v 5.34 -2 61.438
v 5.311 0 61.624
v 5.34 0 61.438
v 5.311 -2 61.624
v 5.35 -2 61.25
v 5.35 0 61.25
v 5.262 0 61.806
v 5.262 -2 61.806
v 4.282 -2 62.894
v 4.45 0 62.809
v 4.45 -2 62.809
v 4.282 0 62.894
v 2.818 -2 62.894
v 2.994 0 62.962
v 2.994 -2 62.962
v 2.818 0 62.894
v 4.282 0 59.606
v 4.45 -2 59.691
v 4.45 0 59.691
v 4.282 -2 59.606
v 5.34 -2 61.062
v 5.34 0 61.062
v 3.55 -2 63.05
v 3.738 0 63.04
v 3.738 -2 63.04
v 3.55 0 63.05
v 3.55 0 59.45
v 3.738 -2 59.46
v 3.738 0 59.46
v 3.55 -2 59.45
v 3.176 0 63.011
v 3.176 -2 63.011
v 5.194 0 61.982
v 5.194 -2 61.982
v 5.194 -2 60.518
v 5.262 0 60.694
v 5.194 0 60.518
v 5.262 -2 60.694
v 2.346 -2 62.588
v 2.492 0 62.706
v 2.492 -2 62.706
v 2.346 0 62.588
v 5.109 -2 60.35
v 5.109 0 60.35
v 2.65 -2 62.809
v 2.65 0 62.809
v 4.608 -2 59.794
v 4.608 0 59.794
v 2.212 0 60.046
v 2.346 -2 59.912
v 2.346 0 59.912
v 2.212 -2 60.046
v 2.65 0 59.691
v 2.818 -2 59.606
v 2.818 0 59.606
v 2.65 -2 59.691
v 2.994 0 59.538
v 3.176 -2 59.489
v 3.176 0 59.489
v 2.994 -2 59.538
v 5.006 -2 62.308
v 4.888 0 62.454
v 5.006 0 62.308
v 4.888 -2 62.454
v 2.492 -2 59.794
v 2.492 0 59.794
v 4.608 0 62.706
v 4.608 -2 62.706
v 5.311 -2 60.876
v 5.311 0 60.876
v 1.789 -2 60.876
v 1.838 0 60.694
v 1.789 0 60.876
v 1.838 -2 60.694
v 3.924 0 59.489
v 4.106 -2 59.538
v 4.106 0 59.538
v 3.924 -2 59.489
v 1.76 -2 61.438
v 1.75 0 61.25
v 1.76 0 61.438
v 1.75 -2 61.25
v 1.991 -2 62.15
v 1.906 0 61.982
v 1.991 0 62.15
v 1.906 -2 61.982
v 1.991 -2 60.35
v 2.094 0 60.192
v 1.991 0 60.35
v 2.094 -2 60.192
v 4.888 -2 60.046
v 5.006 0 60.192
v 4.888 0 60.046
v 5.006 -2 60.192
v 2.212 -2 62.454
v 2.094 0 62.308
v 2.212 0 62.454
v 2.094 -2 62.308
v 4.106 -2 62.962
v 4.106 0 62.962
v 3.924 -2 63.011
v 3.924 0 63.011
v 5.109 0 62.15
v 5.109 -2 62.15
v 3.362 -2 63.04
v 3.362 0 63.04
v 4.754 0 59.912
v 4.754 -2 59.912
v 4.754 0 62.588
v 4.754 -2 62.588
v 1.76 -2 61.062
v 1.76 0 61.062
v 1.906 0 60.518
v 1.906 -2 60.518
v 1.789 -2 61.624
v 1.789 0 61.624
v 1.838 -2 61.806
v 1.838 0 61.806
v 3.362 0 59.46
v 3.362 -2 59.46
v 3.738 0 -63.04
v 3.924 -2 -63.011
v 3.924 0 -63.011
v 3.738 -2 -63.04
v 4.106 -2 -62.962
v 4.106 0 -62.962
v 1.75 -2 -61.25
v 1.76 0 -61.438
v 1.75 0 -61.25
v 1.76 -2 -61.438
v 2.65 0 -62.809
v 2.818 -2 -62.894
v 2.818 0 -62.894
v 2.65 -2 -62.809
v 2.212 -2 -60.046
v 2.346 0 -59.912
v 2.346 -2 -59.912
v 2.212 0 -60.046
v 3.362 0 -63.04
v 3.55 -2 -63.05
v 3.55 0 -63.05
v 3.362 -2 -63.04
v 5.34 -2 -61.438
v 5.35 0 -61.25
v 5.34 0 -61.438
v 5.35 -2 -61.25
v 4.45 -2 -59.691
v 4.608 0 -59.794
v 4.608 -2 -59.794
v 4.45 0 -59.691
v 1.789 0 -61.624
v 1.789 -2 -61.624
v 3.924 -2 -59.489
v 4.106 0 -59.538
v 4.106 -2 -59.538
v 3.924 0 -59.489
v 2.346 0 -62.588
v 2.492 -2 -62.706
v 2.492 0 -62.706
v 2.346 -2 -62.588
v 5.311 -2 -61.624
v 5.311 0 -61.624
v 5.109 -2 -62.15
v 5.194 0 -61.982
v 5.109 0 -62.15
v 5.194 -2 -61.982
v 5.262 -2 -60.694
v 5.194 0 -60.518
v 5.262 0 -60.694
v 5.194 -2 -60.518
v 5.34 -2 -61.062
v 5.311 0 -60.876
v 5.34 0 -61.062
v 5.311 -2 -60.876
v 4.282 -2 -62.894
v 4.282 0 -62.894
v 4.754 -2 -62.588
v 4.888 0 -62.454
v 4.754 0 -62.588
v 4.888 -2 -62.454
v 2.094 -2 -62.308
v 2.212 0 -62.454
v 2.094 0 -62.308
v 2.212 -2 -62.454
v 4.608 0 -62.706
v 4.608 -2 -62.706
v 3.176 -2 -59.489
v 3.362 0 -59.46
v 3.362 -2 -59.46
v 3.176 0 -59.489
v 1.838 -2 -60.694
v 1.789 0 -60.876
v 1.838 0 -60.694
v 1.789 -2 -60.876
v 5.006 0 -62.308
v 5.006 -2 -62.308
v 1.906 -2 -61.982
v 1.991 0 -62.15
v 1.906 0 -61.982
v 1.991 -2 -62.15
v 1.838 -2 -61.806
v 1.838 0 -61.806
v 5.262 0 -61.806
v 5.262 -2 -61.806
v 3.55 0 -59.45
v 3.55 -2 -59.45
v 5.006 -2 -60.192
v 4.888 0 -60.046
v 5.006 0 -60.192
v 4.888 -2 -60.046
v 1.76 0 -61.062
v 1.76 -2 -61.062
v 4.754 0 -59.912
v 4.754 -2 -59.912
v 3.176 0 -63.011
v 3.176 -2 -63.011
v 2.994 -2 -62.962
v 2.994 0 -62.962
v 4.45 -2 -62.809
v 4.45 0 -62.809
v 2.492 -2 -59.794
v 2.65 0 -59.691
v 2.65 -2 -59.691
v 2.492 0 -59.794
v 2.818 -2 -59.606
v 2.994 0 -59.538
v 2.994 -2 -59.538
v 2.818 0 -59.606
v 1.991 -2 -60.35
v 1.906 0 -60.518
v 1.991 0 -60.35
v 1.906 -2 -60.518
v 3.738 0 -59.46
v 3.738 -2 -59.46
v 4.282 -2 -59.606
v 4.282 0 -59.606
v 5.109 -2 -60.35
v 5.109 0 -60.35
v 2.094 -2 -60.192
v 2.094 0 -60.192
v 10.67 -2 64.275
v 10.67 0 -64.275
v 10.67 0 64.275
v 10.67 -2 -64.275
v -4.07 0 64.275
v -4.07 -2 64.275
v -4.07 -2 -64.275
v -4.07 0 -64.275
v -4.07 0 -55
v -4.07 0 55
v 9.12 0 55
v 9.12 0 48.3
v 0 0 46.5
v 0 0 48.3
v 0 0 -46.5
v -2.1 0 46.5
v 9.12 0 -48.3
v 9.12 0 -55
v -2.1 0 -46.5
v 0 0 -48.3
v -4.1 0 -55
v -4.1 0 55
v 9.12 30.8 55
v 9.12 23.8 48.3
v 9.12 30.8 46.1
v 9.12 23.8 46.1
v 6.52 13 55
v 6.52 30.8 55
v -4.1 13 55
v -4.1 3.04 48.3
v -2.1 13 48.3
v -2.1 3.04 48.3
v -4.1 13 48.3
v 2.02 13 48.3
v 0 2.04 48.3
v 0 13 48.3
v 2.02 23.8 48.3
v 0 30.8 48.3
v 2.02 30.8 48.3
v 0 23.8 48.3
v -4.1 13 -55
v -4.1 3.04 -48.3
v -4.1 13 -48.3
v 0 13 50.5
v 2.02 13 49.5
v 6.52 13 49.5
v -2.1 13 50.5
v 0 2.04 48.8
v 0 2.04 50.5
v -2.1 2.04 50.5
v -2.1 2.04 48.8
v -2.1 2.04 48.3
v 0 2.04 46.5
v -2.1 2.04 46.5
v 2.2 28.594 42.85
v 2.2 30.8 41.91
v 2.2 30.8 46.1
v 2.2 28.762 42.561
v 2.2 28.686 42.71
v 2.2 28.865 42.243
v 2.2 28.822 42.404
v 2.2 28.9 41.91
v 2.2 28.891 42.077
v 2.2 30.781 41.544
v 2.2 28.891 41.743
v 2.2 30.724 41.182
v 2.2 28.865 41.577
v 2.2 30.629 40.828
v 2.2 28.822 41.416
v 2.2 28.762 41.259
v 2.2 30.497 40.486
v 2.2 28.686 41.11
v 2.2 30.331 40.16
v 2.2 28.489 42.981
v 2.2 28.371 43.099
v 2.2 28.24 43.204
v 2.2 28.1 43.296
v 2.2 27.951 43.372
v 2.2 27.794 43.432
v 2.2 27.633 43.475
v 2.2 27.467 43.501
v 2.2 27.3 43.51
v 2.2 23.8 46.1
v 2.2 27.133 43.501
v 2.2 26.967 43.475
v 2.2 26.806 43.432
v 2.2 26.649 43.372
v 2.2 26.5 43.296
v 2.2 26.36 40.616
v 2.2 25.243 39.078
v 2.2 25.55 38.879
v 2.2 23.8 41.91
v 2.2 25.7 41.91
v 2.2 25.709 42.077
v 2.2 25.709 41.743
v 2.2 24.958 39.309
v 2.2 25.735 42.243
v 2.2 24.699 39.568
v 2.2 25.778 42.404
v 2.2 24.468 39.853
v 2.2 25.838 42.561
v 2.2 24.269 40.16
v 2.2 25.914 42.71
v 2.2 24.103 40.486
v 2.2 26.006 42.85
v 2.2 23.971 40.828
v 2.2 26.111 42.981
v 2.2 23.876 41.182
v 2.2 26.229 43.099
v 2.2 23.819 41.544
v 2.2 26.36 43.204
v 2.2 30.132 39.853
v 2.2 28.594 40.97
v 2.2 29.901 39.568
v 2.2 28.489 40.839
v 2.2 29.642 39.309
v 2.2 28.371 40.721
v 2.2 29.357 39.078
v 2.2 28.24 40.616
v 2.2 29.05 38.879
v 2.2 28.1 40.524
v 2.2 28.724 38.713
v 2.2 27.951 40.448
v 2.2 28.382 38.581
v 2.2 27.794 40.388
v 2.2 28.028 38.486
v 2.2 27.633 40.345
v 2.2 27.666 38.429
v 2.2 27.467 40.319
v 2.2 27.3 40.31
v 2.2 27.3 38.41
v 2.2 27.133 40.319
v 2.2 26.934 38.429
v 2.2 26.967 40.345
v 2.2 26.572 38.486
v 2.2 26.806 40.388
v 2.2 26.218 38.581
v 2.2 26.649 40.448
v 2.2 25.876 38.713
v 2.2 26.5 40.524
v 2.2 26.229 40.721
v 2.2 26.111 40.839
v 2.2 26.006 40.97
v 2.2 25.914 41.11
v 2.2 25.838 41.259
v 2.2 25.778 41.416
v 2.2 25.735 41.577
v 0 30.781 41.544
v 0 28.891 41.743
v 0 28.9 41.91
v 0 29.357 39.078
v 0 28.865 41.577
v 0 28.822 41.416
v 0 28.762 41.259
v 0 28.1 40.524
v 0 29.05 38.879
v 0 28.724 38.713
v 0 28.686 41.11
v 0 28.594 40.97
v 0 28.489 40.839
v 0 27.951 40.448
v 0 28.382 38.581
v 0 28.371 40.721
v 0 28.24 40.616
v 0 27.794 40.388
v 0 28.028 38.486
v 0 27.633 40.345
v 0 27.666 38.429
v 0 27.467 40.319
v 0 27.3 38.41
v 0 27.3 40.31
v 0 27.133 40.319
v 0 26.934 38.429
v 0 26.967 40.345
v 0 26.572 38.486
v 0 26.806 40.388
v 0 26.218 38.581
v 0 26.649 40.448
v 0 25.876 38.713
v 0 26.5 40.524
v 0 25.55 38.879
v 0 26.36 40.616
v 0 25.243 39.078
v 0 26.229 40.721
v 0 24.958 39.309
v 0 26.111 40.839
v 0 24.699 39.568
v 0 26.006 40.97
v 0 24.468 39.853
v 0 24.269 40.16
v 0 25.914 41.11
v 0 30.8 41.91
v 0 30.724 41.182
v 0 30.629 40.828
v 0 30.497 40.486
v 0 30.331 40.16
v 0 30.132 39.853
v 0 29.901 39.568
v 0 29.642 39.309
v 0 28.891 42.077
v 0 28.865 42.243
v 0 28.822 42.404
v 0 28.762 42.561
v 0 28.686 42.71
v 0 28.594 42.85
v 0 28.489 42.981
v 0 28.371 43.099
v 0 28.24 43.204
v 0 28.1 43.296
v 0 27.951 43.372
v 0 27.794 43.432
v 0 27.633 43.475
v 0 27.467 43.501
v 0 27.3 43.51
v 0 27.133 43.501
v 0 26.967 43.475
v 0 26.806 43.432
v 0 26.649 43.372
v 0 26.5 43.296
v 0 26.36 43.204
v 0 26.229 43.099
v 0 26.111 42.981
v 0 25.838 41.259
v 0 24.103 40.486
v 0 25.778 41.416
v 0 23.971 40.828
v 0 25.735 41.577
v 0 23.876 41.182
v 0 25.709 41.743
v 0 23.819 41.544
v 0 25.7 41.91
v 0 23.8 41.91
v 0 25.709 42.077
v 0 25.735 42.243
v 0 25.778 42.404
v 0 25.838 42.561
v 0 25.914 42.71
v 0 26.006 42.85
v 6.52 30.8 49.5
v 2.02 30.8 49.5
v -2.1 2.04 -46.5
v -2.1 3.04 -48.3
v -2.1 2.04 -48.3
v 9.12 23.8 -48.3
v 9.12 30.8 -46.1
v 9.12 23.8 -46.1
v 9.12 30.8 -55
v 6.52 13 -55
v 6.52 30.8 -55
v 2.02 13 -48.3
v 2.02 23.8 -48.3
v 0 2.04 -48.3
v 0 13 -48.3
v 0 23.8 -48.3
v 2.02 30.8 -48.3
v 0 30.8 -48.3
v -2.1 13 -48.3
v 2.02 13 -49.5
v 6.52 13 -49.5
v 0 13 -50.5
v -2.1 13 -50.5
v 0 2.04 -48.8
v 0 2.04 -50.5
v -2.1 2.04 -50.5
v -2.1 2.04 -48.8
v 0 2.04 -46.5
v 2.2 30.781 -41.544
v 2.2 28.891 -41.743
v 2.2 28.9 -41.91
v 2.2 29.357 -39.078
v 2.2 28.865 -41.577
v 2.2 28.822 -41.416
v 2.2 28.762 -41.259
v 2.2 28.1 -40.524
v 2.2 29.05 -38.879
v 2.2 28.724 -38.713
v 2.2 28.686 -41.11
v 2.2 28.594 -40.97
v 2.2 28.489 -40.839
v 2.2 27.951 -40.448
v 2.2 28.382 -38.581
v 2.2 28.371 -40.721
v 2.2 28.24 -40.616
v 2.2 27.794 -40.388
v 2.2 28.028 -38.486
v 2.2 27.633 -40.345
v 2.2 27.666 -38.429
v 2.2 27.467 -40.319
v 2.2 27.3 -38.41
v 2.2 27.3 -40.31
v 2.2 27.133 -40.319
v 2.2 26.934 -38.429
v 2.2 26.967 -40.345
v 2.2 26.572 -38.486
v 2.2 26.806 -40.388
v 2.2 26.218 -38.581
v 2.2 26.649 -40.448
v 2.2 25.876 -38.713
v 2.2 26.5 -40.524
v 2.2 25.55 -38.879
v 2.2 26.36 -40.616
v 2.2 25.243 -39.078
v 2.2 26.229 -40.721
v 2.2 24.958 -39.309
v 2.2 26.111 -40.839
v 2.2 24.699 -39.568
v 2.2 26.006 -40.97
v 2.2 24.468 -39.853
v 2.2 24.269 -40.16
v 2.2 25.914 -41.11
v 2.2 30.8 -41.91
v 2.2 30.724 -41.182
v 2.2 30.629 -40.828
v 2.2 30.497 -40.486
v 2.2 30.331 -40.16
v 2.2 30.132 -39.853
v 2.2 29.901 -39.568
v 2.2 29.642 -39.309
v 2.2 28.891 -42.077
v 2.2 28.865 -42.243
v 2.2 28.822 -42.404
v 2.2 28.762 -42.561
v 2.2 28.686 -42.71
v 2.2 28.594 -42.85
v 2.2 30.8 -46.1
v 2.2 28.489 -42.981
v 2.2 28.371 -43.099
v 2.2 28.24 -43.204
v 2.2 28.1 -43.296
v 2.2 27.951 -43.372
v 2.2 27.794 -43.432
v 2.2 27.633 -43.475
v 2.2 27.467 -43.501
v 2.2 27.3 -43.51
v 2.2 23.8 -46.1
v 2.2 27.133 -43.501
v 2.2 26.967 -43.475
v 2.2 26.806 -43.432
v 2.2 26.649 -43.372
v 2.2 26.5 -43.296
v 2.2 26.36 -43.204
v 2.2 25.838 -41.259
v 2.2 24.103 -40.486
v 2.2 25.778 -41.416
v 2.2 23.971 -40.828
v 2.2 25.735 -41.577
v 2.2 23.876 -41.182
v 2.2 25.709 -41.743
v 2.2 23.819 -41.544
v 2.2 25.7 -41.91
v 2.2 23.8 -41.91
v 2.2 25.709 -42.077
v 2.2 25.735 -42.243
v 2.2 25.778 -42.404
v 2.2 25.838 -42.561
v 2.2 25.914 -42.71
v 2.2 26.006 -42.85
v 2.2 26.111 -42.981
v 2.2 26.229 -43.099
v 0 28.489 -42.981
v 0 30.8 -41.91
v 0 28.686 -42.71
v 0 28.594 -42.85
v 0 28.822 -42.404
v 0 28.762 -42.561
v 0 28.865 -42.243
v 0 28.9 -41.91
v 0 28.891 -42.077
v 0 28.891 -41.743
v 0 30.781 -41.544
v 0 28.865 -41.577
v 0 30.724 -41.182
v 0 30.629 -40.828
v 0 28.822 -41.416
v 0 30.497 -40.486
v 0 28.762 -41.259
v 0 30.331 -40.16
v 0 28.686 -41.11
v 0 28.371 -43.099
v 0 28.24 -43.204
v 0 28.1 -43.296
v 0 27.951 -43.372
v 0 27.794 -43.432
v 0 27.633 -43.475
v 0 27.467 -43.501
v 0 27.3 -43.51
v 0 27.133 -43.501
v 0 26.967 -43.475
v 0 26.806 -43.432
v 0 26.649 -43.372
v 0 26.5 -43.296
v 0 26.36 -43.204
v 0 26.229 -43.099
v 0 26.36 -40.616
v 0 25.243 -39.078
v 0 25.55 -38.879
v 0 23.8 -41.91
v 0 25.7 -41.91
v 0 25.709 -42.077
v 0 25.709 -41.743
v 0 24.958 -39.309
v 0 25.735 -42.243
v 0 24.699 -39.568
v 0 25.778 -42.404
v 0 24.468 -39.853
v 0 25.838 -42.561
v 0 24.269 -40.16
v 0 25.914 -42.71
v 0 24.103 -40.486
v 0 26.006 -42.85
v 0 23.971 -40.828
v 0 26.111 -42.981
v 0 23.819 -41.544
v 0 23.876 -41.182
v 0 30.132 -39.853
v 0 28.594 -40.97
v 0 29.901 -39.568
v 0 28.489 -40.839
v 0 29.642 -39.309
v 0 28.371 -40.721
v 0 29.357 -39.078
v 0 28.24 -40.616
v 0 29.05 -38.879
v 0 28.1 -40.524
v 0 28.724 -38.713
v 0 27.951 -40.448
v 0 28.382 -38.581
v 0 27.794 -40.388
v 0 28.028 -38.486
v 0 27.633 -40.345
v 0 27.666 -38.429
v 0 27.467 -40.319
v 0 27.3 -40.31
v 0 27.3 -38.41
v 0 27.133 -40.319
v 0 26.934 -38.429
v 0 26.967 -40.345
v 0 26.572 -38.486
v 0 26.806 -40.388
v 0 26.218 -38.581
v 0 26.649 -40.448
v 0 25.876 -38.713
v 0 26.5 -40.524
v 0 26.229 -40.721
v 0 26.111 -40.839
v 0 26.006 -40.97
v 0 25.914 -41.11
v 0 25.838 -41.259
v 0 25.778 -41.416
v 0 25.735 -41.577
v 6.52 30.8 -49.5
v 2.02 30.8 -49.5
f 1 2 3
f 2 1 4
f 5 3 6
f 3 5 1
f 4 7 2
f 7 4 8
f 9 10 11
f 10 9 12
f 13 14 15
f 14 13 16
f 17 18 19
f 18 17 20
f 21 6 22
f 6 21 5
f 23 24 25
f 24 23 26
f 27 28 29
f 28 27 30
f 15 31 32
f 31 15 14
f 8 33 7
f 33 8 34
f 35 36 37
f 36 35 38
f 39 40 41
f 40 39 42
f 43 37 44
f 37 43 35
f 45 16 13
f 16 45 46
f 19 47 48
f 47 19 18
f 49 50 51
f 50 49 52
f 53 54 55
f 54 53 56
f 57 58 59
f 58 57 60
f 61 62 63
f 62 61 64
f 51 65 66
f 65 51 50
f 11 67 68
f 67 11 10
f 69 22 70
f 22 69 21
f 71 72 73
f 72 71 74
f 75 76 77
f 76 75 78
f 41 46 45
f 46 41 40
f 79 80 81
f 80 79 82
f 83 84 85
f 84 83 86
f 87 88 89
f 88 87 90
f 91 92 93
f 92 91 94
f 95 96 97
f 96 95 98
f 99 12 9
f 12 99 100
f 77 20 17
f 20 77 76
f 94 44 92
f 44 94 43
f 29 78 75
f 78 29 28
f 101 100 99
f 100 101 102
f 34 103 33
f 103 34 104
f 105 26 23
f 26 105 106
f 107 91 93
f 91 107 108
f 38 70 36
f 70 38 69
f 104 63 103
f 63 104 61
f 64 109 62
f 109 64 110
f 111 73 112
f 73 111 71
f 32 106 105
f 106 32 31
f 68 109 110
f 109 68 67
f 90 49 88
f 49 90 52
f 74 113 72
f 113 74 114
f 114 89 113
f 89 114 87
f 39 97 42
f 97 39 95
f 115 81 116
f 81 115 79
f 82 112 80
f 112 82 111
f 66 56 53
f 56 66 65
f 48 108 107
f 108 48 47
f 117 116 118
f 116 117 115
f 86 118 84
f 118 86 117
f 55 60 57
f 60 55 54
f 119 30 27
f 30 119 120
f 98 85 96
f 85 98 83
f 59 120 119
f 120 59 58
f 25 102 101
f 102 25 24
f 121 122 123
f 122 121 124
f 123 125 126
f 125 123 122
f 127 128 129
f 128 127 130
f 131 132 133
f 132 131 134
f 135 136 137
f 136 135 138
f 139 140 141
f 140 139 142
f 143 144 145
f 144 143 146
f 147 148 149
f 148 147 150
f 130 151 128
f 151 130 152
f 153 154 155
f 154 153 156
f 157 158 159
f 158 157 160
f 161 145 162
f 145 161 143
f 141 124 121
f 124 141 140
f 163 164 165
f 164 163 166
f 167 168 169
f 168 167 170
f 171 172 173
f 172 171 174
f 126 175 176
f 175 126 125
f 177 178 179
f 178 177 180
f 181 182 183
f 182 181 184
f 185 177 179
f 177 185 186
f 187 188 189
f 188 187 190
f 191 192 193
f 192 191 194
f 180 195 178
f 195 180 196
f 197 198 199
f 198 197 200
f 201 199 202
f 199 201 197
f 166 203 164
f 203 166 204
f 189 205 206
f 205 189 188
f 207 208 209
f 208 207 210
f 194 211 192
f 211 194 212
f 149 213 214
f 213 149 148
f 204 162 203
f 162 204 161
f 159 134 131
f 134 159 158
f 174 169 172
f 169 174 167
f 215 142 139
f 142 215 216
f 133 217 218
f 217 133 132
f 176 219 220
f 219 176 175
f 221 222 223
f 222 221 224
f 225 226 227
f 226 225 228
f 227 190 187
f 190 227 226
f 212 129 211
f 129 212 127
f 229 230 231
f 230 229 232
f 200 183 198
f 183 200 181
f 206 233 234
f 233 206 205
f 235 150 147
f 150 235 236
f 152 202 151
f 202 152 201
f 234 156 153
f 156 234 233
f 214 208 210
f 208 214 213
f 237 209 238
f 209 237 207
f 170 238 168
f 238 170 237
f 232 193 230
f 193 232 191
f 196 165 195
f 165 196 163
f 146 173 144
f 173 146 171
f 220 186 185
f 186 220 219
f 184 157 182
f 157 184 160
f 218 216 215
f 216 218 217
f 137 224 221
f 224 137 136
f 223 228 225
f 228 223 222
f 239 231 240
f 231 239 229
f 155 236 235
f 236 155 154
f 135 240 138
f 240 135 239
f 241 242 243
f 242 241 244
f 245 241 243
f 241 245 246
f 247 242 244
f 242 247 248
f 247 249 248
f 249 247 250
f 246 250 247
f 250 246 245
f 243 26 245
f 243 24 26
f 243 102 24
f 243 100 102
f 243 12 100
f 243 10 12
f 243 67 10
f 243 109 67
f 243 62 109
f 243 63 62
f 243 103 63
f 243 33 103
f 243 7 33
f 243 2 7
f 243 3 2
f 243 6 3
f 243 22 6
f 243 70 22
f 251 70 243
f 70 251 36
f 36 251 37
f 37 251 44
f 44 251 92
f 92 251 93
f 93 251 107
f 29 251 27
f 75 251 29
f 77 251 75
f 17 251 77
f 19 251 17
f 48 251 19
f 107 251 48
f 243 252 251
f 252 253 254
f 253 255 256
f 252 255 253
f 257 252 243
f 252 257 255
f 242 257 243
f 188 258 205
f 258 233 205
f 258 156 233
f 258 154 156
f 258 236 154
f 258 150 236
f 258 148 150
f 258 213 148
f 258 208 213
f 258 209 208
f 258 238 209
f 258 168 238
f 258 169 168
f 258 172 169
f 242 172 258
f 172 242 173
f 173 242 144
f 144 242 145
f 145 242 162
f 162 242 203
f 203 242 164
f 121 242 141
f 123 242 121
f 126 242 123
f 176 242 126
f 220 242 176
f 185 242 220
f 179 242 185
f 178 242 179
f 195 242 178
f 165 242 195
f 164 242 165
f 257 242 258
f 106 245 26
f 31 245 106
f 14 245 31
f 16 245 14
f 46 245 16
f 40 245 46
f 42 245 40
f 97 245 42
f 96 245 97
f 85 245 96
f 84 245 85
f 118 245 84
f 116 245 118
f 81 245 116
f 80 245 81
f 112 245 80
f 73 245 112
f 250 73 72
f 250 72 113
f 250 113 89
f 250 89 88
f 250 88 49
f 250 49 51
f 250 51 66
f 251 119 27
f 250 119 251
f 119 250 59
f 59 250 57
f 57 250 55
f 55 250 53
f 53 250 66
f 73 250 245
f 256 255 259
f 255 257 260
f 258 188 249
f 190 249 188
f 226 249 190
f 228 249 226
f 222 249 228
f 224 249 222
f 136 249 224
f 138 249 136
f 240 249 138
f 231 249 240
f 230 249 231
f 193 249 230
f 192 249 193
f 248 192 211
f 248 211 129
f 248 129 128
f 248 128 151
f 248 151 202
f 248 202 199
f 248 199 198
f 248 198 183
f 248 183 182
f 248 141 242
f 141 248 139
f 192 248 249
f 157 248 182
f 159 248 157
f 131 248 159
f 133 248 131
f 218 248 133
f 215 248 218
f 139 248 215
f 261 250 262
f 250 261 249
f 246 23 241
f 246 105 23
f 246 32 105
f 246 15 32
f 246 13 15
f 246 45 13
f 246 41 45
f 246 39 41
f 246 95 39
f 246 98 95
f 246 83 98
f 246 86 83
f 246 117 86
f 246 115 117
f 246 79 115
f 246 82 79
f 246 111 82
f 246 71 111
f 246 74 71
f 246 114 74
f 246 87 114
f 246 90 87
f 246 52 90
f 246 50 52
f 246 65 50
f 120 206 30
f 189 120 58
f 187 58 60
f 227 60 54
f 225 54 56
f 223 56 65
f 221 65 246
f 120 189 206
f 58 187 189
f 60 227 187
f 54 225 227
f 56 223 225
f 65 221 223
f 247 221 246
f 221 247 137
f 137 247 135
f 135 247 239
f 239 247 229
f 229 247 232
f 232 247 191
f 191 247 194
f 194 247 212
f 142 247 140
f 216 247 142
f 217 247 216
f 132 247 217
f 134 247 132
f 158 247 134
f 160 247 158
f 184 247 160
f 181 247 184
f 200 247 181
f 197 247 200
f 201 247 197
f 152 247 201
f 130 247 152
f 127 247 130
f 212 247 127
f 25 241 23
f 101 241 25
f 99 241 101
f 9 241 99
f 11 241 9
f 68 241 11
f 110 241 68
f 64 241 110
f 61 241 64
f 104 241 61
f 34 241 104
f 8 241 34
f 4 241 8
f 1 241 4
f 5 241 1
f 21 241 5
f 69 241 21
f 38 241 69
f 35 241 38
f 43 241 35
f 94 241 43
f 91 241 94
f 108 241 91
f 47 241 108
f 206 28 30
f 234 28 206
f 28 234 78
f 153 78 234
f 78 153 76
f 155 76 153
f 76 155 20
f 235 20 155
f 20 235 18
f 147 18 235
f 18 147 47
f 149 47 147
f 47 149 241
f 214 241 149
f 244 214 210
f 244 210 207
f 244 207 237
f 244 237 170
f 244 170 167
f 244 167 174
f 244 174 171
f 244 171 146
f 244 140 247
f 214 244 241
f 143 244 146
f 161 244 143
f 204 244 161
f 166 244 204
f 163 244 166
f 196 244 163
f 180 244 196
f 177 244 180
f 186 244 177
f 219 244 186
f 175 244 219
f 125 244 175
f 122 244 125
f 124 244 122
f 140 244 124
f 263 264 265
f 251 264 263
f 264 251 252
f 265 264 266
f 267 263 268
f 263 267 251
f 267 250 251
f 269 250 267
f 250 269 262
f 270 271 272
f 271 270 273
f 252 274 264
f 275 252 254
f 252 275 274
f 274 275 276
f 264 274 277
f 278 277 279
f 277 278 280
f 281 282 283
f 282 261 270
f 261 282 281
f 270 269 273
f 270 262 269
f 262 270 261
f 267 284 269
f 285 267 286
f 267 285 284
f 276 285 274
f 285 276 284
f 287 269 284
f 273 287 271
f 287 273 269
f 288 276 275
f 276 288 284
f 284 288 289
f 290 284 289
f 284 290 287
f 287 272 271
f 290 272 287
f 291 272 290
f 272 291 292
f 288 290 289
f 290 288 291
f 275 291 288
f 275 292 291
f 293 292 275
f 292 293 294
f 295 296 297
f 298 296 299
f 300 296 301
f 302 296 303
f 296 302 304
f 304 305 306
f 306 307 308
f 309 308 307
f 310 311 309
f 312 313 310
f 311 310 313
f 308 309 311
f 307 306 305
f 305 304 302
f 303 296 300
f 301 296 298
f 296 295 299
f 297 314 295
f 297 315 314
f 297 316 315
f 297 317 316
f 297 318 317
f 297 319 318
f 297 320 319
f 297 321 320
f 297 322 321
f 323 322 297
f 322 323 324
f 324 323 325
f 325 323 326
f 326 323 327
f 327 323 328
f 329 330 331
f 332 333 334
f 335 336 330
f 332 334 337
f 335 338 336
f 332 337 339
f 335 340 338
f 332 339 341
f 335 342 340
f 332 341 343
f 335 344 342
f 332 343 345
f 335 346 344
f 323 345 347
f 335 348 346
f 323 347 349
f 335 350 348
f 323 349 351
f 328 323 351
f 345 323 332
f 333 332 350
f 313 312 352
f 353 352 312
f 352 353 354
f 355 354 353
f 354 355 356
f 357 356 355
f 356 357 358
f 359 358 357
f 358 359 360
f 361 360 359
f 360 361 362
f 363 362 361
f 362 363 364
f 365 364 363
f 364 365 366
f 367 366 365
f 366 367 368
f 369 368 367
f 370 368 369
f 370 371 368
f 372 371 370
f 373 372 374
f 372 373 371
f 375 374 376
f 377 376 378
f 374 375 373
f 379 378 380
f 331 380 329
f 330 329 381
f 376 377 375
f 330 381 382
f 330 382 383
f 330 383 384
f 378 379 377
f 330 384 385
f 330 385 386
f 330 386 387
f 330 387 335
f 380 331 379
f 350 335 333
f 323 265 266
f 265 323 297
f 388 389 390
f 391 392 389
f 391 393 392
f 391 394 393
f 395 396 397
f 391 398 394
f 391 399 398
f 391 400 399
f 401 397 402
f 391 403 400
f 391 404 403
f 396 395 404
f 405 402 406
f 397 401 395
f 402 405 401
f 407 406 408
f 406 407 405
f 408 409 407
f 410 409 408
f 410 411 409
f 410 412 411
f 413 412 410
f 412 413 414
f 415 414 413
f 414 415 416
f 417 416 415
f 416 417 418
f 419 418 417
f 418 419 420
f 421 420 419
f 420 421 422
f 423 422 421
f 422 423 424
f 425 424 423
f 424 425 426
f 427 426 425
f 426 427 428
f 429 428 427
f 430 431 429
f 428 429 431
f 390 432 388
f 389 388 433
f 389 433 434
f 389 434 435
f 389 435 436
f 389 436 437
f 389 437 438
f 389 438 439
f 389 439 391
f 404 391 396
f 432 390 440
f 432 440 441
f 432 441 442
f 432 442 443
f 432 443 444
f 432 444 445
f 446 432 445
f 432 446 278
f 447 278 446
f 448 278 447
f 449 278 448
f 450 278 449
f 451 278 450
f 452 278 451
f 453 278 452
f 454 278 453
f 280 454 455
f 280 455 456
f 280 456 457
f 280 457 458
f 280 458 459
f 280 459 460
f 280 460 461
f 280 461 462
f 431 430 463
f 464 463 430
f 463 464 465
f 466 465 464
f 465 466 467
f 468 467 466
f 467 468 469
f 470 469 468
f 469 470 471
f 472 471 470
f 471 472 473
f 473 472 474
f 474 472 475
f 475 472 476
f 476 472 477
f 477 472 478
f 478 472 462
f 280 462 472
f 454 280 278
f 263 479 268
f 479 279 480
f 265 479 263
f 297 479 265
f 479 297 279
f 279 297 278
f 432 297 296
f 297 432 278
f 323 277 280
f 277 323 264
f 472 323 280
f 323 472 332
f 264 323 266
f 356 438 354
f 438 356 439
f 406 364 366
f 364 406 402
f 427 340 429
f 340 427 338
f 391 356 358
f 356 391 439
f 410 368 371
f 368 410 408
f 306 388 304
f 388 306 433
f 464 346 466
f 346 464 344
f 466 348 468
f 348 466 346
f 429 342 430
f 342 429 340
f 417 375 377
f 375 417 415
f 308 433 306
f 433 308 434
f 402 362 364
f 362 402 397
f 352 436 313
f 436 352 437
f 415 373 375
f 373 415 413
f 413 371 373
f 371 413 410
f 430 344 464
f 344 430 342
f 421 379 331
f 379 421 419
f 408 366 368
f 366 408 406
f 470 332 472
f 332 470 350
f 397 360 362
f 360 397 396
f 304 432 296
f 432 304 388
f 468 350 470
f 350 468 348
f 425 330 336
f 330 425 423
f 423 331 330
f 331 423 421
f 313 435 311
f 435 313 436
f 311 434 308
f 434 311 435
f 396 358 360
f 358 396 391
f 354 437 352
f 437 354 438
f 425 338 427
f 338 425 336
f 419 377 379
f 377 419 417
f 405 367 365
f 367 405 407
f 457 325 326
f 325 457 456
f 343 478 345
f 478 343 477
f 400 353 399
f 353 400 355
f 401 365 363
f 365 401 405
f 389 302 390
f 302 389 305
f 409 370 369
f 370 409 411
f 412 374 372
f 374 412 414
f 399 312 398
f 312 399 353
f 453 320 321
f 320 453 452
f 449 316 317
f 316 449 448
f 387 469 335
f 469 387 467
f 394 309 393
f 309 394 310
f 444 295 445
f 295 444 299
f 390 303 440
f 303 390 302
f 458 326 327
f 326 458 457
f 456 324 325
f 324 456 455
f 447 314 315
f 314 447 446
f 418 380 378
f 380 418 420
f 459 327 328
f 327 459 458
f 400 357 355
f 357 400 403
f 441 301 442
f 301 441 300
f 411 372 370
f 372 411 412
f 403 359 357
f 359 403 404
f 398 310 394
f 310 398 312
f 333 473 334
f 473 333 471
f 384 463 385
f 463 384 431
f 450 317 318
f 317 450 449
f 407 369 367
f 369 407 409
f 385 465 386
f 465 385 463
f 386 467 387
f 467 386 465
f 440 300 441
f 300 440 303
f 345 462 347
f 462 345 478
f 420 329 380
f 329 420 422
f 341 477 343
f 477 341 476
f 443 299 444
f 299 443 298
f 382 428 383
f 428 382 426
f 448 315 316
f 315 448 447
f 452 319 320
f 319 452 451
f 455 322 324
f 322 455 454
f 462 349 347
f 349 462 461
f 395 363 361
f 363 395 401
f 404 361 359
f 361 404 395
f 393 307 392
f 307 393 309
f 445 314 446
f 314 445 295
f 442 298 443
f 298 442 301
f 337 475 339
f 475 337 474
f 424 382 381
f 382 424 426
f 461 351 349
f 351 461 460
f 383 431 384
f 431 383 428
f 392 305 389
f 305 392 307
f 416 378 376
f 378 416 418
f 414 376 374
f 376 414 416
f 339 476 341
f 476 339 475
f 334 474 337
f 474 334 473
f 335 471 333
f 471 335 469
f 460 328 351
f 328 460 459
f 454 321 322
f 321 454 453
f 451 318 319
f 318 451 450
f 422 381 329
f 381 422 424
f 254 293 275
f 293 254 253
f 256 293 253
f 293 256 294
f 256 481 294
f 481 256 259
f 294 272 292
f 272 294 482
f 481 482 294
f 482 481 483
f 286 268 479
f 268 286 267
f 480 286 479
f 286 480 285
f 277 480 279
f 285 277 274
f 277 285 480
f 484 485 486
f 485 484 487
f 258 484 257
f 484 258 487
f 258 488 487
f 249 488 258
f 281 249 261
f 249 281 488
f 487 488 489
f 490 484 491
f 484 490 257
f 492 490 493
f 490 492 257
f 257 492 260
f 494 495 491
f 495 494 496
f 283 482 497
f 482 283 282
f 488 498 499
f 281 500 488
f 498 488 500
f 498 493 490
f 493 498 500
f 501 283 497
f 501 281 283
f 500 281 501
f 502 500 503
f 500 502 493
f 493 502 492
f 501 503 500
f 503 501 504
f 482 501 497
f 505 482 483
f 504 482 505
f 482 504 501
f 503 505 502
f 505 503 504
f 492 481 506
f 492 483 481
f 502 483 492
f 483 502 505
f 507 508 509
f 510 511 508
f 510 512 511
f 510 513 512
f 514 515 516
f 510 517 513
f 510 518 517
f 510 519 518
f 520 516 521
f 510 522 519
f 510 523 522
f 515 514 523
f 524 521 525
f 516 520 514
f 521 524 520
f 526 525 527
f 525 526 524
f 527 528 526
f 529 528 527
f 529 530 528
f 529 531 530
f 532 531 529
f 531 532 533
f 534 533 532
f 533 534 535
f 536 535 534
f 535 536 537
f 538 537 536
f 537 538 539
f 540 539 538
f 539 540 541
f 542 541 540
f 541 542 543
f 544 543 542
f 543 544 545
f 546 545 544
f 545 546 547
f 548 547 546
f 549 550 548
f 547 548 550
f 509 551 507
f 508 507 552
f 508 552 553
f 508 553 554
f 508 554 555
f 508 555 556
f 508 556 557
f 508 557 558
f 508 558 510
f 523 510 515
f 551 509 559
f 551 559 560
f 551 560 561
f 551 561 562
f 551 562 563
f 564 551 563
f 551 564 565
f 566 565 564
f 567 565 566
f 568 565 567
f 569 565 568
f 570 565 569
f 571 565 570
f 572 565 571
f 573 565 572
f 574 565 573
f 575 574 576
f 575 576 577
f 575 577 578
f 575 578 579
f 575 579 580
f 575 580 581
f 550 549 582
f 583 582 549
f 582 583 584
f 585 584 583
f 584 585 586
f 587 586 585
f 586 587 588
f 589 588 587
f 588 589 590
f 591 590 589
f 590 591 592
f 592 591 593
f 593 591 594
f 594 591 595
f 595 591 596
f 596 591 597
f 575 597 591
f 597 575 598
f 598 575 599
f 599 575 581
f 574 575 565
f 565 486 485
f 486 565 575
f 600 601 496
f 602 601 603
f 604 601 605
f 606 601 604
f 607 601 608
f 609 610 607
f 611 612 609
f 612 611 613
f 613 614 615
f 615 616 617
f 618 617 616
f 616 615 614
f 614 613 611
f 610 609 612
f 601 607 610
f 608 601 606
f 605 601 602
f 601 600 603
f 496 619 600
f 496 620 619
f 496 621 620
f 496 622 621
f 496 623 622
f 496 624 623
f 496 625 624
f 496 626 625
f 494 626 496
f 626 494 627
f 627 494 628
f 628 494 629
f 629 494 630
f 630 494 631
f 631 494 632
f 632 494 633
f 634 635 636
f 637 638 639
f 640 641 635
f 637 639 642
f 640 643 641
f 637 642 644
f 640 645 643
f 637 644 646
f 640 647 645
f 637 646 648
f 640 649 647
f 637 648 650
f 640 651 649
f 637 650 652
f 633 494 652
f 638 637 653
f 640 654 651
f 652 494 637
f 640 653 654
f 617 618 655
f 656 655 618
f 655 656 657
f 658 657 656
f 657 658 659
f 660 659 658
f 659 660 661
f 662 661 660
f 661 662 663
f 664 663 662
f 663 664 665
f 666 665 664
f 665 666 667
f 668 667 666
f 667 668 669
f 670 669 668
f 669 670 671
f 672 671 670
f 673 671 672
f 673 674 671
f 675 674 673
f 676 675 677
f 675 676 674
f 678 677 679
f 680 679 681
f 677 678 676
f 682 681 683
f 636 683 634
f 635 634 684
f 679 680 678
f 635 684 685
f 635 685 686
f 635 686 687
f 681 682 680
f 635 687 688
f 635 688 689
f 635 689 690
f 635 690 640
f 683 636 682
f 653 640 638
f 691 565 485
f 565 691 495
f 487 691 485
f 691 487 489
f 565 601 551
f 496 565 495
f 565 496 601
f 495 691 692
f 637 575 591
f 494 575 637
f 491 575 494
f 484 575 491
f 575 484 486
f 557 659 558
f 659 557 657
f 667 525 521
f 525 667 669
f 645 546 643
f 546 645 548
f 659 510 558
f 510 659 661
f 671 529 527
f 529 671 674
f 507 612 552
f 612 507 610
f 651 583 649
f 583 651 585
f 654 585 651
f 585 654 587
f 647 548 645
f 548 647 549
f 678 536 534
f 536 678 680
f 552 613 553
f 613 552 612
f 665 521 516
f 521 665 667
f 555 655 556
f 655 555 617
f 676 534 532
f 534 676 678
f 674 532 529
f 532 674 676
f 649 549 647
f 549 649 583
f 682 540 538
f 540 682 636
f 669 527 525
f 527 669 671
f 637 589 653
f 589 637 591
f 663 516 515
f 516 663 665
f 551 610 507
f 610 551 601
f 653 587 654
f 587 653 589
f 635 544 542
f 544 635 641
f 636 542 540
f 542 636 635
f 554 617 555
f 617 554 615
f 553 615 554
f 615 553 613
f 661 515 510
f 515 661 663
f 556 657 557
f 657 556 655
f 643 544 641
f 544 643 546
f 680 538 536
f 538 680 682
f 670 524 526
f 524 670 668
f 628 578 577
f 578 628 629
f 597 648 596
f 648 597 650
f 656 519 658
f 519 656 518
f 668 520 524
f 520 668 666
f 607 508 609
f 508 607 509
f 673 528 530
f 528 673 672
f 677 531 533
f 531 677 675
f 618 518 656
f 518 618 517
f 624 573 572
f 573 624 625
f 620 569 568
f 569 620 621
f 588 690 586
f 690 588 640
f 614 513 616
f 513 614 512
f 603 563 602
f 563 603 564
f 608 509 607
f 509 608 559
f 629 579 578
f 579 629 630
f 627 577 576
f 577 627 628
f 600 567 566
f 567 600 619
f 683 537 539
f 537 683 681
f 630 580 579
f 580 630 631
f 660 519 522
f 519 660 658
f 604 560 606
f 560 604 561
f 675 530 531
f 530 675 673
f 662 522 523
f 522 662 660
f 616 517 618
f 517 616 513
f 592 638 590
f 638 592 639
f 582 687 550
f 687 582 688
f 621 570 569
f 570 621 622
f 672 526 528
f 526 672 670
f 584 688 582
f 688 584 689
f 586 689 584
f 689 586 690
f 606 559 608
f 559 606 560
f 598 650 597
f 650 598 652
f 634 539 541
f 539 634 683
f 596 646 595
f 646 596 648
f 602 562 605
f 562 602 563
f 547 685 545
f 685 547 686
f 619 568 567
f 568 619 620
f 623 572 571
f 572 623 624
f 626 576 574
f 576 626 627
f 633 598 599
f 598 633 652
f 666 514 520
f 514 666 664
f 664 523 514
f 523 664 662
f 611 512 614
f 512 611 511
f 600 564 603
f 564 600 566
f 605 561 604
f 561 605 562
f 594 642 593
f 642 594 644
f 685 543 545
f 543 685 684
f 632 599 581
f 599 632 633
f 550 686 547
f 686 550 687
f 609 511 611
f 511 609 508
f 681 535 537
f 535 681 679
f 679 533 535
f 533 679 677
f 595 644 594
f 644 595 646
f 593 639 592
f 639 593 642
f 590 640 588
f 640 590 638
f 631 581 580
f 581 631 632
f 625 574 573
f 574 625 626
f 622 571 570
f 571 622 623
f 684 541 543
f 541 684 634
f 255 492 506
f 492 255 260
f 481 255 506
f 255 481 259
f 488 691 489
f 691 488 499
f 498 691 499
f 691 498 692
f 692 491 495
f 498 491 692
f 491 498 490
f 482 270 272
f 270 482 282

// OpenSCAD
// file: include/cec-common.scad
///////////////////////////////////////////////////////
// Constants and values derived from the specs.

// 19 Inch Rack (IEC-60297-3-100)
rackUnit = 44.45; // Distances in millimeters (mm)
cecCageHeight = rackUnit * 3; // 3U
cecH2 = 57.15; // Spacing between rack ear mount holes
cecH3 = 37.70; // Spacing between bottom hole and bottom of front panel

// EuroCard Sub Cage (IEC-60297-3-101)
cecH1 = 132.55; // Sub rack height (considering clearances)
cecH5 = 112.00; // Vertical aperture opening dimension
cecH6 = 122.50; // Vertical mounting hole dimension (front rails)
cecH6prm = 117.00; // Vertical mounting hole dimension (backplane rails)
cecH8 = 128.55; // Height of front panel pieces
cecH9 = cecH6; // Vertical mounting hole dimension (front panels)
cecH9prm = cecH6prm; // Vertical mounting hole dimension (backplane mounting brackets)
HPUnit = 5.08; // Horizontal Pitch (HP) unit
cecRackWidth = HPUnit * 84; // 84 HP
cecClearance = 0.50; // mm
cecWidth = HPUnit * 3; // 3 HP panel width

echo(cecWidth=cecWidth);

// EuroCard Module (IEC-60297-3-101)
cecH10 = 100.00; // Height of EuroCard PCB

cecPCBOffset = 4.07; // Left side of front panel to right (compoenet) side of PCB
cecPCBSetback = 2.54;
cecPCBThickness = 1.60; // PCB Thickness

// Half depth (Compact) EuroCard (100mm by 80mm).
cecD1est = 88.60; // Depth from rear of front plate to backplane PCB
cecD3 = 80.00; // PCB depth

// Compact EuroCard (CEC) specific.
cec_a = cecPCBSetback; // Space between front plate and PCB (from spec)
cec_b = cecD3; // PCB depth
cec_c = 6.98; // Ref hole set back from board edge (backplane edge)
cec_d = 10.10; // Ref hole to edge of connector (and mating platform)
cec_e = 2.60; // Height of mating connector platform from backplane
cec_f = 0; // TBD - Bracket mount hole from front of PCB
cec_g = 0; // TBD - Bracket mount hole from top/bottom of PCB
cec_h = 0; // TBD - Ref hole from top of PCB

// D1 - Depth from rear of front plate to backplane PCB
cecD1tol = cecClearance;
cecD1 = cec_a + cec_b - cec_c + cec_d + cec_e + cecD1tol;

echo(cecD1est=cecD1est, cecD1=cecD1);

cecPanelThickness = 2.00;
cecPanelRidgeThickness = cecPanelThickness;

cecBracketPCBSlotDepth = 1.70; // Bracket PCB slot depth / PCB edge keep-out.

// We want hole piece to extend past each side
// to avoid infintisimal film covering.
cecHoleExt = 0.5; // mm

// Hole diameter for M2.5 (or M3 tight fit) machine screw.
cecPanelPlateHoleDia = 3.6; // mm

// Hole for M2.5 machine screws.
cecPCBMountHoleDia = 3.2; // mm


///////////////////////////////////////////////////////
// Handy functions useful in context of symmetry.
function halfOf(val) = val / 2.0;
function doubleOf(val) = val * 2.0;
// file: include/cec-bb2-board.scad
include <cec-common.scad>

///////////////////////////////////////////////////////
// Reference design based on BPS BB2 100mm by 80mm
// prototyping BusBoard.  Orientation is:
//   Height (long side of board) - Z axis - rows
//   Depth (short side of board) - Y axis - columns
//   Thickness (thickness of board) - X- axis
bb2Height = cecH10; // 100mm
bb2Depth = cecD3; // 80mm
bb2HoleSpacing = 2.54; // 2.54mm (breadboard spacing)
bb2NumRows = 38; // Rows of holes
bb2NumCols = 31; // Columns of holes
// Note: The margins on each side of the hole matrix
//       appear symmetrical top and bottom, and
//       front and rear.
bb2MarginTB = halfOf(bb2Height - ((bb2NumRows - 1) *
    bb2HoleSpacing)); // Margin at top and bottom.
bb2MarginFR = halfOf(bb2Depth - ((bb2NumCols - 1) *
    bb2HoleSpacing)); // Margin at front and rear.

echo(bb2MarginTB=bb2MarginTB, bb2MarginFR=bb2MarginFR);

// PCB mount hole locations are symmetrical top
// and bottom so we specify the top one as hole
// coordinates.  (Starting count from 1 not 0).
cecPCBHoleFrontOffset = 10; // Columns from front of PCB.
cecPCBHoleEdgeOffset = 3; // Rows from each side of PCB.


function bb2Col2YCoord(col) = bb2MarginFR + (col -
    1) * bb2HoleSpacing; // Offset from front of PCB.
function bb2Row2ZCoord(row) = bb2MarginTB + (row -
    1) * bb2HoleSpacing; // Offset from (top) side of PCB.

// These are computed, but can be overriden for a custom
// PCB based on a different format.
// Note: These are relative to the PCB top/bottom front
//       corners.
cecPCBHoleYBrd = bb2MarginFR + (cecPCBHoleFrontOffset -
    1) * bb2HoleSpacing; // Offset from front of PCB.
cecPCBHoleZBrd = bb2MarginTB + (cecPCBHoleEdgeOffset -
    1) * bb2HoleSpacing; // Offset from each side of PCB.

echo(cecPCBHoleYBrd=cecPCBHoleYBrd, cecPCBHoleZBrd=cecPCBHoleZBrd);

// Absolute coordinates.
cecPCBHoleYCoord = cecPCBSetback + cecPCBHoleYBrd;
cecPCBHoleZCoord = halfOf(bb2Height) - cecPCBHoleZBrd;

echo(cecPCBHoleYCoord=cecPCBHoleYCoord, cecPCBHoleZCoord=cecPCBHoleZCoord);
// main file
// CEC 3HP Plain Faceplate With PCB Mount Brackets
// Copyright (C) 2025 Darcy L. Watkins

include <include/cec-3hp-faceplate-with-brackets.scad>

cecWClearance = cecClearance; // Set to standard

module cecPanel()
{
    // Panel plate, minus the holes, plus the ridge,
    // plus the two PCB spacers.
    union()
    {
        difference()
        {
            // Panel plate
            cecPanelPlate();
            // Mounting holes on each end
            cecPanelMountingHoles();
        }
        // Panel ridge
        cecPanelRidge();
        // Top PBC spacer
        cecPCBBracket();
        // Bottom PCB spacer
        mirror([0,0,1])
        cecPCBBracket();
    }
}

///////////////////////////////////////////////////////
// Main program to rendor the project.

// Make curves smoother
$fs = 0.25; // 3D printer layer thickness
$fa = 1;    // 1 degree increments minimum
$fn = 60;   // 60 items

cecPanel();
